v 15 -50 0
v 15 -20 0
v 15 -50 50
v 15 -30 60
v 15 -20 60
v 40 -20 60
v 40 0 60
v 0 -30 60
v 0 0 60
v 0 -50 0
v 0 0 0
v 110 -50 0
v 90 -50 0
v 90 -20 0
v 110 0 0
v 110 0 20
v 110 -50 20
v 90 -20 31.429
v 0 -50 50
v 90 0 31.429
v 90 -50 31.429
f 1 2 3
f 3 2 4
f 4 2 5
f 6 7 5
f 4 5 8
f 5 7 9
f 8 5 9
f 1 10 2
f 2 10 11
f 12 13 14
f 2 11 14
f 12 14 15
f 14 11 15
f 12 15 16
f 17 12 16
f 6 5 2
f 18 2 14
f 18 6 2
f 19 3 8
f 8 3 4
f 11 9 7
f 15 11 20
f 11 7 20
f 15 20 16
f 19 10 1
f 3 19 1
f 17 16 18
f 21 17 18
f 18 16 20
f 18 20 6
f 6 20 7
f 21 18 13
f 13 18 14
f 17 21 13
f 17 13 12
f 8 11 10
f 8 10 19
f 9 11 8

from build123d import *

# Parameters (mm, degrees)
F0_W     = 15
F0_H     = 60
F1_DEPTH = 50
F2_DEPTH = 20
F4_DEPTH = 15


with BuildPart() as f1:
    # F0 (on Front) → F1 (new body)
    with BuildSketch(Plane.XZ):
        with Locations((7.5, 30)):
            Rectangle(F0_W, F0_H)
    extrude(amount=F1_DEPTH)



with BuildPart() as f1b:
    # F0 (on Front) → F1, piece 2 (new body)
    with BuildSketch(Plane.XZ):
        Polygon((90, 31.4285714286), (90, 0), (110, 0), (110, 20), align=None)
    extrude(amount=F1_DEPTH)


with BuildPart() as f1_1:
    add(f1.part)

    add(f1b.part)  # F2 merges F1b
    # F0 (on Front) → F2 (join)
    with BuildSketch(Plane.XZ):
        Polygon((15, 60), (15, 0), (90, 0), (90, 31.4285714286), (40, 60), align=None)
    extrude(amount=F2_DEPTH)

    # F3 (on face) → F4 (cut)
    with BuildSketch(Plane.YZ.offset(15)):
        Polygon((-50, 60), (-50, 50), (-30, 60), align=None)
    extrude(amount=-F4_DEPTH, mode=Mode.SUBTRACT)


solid = f1_1.part
